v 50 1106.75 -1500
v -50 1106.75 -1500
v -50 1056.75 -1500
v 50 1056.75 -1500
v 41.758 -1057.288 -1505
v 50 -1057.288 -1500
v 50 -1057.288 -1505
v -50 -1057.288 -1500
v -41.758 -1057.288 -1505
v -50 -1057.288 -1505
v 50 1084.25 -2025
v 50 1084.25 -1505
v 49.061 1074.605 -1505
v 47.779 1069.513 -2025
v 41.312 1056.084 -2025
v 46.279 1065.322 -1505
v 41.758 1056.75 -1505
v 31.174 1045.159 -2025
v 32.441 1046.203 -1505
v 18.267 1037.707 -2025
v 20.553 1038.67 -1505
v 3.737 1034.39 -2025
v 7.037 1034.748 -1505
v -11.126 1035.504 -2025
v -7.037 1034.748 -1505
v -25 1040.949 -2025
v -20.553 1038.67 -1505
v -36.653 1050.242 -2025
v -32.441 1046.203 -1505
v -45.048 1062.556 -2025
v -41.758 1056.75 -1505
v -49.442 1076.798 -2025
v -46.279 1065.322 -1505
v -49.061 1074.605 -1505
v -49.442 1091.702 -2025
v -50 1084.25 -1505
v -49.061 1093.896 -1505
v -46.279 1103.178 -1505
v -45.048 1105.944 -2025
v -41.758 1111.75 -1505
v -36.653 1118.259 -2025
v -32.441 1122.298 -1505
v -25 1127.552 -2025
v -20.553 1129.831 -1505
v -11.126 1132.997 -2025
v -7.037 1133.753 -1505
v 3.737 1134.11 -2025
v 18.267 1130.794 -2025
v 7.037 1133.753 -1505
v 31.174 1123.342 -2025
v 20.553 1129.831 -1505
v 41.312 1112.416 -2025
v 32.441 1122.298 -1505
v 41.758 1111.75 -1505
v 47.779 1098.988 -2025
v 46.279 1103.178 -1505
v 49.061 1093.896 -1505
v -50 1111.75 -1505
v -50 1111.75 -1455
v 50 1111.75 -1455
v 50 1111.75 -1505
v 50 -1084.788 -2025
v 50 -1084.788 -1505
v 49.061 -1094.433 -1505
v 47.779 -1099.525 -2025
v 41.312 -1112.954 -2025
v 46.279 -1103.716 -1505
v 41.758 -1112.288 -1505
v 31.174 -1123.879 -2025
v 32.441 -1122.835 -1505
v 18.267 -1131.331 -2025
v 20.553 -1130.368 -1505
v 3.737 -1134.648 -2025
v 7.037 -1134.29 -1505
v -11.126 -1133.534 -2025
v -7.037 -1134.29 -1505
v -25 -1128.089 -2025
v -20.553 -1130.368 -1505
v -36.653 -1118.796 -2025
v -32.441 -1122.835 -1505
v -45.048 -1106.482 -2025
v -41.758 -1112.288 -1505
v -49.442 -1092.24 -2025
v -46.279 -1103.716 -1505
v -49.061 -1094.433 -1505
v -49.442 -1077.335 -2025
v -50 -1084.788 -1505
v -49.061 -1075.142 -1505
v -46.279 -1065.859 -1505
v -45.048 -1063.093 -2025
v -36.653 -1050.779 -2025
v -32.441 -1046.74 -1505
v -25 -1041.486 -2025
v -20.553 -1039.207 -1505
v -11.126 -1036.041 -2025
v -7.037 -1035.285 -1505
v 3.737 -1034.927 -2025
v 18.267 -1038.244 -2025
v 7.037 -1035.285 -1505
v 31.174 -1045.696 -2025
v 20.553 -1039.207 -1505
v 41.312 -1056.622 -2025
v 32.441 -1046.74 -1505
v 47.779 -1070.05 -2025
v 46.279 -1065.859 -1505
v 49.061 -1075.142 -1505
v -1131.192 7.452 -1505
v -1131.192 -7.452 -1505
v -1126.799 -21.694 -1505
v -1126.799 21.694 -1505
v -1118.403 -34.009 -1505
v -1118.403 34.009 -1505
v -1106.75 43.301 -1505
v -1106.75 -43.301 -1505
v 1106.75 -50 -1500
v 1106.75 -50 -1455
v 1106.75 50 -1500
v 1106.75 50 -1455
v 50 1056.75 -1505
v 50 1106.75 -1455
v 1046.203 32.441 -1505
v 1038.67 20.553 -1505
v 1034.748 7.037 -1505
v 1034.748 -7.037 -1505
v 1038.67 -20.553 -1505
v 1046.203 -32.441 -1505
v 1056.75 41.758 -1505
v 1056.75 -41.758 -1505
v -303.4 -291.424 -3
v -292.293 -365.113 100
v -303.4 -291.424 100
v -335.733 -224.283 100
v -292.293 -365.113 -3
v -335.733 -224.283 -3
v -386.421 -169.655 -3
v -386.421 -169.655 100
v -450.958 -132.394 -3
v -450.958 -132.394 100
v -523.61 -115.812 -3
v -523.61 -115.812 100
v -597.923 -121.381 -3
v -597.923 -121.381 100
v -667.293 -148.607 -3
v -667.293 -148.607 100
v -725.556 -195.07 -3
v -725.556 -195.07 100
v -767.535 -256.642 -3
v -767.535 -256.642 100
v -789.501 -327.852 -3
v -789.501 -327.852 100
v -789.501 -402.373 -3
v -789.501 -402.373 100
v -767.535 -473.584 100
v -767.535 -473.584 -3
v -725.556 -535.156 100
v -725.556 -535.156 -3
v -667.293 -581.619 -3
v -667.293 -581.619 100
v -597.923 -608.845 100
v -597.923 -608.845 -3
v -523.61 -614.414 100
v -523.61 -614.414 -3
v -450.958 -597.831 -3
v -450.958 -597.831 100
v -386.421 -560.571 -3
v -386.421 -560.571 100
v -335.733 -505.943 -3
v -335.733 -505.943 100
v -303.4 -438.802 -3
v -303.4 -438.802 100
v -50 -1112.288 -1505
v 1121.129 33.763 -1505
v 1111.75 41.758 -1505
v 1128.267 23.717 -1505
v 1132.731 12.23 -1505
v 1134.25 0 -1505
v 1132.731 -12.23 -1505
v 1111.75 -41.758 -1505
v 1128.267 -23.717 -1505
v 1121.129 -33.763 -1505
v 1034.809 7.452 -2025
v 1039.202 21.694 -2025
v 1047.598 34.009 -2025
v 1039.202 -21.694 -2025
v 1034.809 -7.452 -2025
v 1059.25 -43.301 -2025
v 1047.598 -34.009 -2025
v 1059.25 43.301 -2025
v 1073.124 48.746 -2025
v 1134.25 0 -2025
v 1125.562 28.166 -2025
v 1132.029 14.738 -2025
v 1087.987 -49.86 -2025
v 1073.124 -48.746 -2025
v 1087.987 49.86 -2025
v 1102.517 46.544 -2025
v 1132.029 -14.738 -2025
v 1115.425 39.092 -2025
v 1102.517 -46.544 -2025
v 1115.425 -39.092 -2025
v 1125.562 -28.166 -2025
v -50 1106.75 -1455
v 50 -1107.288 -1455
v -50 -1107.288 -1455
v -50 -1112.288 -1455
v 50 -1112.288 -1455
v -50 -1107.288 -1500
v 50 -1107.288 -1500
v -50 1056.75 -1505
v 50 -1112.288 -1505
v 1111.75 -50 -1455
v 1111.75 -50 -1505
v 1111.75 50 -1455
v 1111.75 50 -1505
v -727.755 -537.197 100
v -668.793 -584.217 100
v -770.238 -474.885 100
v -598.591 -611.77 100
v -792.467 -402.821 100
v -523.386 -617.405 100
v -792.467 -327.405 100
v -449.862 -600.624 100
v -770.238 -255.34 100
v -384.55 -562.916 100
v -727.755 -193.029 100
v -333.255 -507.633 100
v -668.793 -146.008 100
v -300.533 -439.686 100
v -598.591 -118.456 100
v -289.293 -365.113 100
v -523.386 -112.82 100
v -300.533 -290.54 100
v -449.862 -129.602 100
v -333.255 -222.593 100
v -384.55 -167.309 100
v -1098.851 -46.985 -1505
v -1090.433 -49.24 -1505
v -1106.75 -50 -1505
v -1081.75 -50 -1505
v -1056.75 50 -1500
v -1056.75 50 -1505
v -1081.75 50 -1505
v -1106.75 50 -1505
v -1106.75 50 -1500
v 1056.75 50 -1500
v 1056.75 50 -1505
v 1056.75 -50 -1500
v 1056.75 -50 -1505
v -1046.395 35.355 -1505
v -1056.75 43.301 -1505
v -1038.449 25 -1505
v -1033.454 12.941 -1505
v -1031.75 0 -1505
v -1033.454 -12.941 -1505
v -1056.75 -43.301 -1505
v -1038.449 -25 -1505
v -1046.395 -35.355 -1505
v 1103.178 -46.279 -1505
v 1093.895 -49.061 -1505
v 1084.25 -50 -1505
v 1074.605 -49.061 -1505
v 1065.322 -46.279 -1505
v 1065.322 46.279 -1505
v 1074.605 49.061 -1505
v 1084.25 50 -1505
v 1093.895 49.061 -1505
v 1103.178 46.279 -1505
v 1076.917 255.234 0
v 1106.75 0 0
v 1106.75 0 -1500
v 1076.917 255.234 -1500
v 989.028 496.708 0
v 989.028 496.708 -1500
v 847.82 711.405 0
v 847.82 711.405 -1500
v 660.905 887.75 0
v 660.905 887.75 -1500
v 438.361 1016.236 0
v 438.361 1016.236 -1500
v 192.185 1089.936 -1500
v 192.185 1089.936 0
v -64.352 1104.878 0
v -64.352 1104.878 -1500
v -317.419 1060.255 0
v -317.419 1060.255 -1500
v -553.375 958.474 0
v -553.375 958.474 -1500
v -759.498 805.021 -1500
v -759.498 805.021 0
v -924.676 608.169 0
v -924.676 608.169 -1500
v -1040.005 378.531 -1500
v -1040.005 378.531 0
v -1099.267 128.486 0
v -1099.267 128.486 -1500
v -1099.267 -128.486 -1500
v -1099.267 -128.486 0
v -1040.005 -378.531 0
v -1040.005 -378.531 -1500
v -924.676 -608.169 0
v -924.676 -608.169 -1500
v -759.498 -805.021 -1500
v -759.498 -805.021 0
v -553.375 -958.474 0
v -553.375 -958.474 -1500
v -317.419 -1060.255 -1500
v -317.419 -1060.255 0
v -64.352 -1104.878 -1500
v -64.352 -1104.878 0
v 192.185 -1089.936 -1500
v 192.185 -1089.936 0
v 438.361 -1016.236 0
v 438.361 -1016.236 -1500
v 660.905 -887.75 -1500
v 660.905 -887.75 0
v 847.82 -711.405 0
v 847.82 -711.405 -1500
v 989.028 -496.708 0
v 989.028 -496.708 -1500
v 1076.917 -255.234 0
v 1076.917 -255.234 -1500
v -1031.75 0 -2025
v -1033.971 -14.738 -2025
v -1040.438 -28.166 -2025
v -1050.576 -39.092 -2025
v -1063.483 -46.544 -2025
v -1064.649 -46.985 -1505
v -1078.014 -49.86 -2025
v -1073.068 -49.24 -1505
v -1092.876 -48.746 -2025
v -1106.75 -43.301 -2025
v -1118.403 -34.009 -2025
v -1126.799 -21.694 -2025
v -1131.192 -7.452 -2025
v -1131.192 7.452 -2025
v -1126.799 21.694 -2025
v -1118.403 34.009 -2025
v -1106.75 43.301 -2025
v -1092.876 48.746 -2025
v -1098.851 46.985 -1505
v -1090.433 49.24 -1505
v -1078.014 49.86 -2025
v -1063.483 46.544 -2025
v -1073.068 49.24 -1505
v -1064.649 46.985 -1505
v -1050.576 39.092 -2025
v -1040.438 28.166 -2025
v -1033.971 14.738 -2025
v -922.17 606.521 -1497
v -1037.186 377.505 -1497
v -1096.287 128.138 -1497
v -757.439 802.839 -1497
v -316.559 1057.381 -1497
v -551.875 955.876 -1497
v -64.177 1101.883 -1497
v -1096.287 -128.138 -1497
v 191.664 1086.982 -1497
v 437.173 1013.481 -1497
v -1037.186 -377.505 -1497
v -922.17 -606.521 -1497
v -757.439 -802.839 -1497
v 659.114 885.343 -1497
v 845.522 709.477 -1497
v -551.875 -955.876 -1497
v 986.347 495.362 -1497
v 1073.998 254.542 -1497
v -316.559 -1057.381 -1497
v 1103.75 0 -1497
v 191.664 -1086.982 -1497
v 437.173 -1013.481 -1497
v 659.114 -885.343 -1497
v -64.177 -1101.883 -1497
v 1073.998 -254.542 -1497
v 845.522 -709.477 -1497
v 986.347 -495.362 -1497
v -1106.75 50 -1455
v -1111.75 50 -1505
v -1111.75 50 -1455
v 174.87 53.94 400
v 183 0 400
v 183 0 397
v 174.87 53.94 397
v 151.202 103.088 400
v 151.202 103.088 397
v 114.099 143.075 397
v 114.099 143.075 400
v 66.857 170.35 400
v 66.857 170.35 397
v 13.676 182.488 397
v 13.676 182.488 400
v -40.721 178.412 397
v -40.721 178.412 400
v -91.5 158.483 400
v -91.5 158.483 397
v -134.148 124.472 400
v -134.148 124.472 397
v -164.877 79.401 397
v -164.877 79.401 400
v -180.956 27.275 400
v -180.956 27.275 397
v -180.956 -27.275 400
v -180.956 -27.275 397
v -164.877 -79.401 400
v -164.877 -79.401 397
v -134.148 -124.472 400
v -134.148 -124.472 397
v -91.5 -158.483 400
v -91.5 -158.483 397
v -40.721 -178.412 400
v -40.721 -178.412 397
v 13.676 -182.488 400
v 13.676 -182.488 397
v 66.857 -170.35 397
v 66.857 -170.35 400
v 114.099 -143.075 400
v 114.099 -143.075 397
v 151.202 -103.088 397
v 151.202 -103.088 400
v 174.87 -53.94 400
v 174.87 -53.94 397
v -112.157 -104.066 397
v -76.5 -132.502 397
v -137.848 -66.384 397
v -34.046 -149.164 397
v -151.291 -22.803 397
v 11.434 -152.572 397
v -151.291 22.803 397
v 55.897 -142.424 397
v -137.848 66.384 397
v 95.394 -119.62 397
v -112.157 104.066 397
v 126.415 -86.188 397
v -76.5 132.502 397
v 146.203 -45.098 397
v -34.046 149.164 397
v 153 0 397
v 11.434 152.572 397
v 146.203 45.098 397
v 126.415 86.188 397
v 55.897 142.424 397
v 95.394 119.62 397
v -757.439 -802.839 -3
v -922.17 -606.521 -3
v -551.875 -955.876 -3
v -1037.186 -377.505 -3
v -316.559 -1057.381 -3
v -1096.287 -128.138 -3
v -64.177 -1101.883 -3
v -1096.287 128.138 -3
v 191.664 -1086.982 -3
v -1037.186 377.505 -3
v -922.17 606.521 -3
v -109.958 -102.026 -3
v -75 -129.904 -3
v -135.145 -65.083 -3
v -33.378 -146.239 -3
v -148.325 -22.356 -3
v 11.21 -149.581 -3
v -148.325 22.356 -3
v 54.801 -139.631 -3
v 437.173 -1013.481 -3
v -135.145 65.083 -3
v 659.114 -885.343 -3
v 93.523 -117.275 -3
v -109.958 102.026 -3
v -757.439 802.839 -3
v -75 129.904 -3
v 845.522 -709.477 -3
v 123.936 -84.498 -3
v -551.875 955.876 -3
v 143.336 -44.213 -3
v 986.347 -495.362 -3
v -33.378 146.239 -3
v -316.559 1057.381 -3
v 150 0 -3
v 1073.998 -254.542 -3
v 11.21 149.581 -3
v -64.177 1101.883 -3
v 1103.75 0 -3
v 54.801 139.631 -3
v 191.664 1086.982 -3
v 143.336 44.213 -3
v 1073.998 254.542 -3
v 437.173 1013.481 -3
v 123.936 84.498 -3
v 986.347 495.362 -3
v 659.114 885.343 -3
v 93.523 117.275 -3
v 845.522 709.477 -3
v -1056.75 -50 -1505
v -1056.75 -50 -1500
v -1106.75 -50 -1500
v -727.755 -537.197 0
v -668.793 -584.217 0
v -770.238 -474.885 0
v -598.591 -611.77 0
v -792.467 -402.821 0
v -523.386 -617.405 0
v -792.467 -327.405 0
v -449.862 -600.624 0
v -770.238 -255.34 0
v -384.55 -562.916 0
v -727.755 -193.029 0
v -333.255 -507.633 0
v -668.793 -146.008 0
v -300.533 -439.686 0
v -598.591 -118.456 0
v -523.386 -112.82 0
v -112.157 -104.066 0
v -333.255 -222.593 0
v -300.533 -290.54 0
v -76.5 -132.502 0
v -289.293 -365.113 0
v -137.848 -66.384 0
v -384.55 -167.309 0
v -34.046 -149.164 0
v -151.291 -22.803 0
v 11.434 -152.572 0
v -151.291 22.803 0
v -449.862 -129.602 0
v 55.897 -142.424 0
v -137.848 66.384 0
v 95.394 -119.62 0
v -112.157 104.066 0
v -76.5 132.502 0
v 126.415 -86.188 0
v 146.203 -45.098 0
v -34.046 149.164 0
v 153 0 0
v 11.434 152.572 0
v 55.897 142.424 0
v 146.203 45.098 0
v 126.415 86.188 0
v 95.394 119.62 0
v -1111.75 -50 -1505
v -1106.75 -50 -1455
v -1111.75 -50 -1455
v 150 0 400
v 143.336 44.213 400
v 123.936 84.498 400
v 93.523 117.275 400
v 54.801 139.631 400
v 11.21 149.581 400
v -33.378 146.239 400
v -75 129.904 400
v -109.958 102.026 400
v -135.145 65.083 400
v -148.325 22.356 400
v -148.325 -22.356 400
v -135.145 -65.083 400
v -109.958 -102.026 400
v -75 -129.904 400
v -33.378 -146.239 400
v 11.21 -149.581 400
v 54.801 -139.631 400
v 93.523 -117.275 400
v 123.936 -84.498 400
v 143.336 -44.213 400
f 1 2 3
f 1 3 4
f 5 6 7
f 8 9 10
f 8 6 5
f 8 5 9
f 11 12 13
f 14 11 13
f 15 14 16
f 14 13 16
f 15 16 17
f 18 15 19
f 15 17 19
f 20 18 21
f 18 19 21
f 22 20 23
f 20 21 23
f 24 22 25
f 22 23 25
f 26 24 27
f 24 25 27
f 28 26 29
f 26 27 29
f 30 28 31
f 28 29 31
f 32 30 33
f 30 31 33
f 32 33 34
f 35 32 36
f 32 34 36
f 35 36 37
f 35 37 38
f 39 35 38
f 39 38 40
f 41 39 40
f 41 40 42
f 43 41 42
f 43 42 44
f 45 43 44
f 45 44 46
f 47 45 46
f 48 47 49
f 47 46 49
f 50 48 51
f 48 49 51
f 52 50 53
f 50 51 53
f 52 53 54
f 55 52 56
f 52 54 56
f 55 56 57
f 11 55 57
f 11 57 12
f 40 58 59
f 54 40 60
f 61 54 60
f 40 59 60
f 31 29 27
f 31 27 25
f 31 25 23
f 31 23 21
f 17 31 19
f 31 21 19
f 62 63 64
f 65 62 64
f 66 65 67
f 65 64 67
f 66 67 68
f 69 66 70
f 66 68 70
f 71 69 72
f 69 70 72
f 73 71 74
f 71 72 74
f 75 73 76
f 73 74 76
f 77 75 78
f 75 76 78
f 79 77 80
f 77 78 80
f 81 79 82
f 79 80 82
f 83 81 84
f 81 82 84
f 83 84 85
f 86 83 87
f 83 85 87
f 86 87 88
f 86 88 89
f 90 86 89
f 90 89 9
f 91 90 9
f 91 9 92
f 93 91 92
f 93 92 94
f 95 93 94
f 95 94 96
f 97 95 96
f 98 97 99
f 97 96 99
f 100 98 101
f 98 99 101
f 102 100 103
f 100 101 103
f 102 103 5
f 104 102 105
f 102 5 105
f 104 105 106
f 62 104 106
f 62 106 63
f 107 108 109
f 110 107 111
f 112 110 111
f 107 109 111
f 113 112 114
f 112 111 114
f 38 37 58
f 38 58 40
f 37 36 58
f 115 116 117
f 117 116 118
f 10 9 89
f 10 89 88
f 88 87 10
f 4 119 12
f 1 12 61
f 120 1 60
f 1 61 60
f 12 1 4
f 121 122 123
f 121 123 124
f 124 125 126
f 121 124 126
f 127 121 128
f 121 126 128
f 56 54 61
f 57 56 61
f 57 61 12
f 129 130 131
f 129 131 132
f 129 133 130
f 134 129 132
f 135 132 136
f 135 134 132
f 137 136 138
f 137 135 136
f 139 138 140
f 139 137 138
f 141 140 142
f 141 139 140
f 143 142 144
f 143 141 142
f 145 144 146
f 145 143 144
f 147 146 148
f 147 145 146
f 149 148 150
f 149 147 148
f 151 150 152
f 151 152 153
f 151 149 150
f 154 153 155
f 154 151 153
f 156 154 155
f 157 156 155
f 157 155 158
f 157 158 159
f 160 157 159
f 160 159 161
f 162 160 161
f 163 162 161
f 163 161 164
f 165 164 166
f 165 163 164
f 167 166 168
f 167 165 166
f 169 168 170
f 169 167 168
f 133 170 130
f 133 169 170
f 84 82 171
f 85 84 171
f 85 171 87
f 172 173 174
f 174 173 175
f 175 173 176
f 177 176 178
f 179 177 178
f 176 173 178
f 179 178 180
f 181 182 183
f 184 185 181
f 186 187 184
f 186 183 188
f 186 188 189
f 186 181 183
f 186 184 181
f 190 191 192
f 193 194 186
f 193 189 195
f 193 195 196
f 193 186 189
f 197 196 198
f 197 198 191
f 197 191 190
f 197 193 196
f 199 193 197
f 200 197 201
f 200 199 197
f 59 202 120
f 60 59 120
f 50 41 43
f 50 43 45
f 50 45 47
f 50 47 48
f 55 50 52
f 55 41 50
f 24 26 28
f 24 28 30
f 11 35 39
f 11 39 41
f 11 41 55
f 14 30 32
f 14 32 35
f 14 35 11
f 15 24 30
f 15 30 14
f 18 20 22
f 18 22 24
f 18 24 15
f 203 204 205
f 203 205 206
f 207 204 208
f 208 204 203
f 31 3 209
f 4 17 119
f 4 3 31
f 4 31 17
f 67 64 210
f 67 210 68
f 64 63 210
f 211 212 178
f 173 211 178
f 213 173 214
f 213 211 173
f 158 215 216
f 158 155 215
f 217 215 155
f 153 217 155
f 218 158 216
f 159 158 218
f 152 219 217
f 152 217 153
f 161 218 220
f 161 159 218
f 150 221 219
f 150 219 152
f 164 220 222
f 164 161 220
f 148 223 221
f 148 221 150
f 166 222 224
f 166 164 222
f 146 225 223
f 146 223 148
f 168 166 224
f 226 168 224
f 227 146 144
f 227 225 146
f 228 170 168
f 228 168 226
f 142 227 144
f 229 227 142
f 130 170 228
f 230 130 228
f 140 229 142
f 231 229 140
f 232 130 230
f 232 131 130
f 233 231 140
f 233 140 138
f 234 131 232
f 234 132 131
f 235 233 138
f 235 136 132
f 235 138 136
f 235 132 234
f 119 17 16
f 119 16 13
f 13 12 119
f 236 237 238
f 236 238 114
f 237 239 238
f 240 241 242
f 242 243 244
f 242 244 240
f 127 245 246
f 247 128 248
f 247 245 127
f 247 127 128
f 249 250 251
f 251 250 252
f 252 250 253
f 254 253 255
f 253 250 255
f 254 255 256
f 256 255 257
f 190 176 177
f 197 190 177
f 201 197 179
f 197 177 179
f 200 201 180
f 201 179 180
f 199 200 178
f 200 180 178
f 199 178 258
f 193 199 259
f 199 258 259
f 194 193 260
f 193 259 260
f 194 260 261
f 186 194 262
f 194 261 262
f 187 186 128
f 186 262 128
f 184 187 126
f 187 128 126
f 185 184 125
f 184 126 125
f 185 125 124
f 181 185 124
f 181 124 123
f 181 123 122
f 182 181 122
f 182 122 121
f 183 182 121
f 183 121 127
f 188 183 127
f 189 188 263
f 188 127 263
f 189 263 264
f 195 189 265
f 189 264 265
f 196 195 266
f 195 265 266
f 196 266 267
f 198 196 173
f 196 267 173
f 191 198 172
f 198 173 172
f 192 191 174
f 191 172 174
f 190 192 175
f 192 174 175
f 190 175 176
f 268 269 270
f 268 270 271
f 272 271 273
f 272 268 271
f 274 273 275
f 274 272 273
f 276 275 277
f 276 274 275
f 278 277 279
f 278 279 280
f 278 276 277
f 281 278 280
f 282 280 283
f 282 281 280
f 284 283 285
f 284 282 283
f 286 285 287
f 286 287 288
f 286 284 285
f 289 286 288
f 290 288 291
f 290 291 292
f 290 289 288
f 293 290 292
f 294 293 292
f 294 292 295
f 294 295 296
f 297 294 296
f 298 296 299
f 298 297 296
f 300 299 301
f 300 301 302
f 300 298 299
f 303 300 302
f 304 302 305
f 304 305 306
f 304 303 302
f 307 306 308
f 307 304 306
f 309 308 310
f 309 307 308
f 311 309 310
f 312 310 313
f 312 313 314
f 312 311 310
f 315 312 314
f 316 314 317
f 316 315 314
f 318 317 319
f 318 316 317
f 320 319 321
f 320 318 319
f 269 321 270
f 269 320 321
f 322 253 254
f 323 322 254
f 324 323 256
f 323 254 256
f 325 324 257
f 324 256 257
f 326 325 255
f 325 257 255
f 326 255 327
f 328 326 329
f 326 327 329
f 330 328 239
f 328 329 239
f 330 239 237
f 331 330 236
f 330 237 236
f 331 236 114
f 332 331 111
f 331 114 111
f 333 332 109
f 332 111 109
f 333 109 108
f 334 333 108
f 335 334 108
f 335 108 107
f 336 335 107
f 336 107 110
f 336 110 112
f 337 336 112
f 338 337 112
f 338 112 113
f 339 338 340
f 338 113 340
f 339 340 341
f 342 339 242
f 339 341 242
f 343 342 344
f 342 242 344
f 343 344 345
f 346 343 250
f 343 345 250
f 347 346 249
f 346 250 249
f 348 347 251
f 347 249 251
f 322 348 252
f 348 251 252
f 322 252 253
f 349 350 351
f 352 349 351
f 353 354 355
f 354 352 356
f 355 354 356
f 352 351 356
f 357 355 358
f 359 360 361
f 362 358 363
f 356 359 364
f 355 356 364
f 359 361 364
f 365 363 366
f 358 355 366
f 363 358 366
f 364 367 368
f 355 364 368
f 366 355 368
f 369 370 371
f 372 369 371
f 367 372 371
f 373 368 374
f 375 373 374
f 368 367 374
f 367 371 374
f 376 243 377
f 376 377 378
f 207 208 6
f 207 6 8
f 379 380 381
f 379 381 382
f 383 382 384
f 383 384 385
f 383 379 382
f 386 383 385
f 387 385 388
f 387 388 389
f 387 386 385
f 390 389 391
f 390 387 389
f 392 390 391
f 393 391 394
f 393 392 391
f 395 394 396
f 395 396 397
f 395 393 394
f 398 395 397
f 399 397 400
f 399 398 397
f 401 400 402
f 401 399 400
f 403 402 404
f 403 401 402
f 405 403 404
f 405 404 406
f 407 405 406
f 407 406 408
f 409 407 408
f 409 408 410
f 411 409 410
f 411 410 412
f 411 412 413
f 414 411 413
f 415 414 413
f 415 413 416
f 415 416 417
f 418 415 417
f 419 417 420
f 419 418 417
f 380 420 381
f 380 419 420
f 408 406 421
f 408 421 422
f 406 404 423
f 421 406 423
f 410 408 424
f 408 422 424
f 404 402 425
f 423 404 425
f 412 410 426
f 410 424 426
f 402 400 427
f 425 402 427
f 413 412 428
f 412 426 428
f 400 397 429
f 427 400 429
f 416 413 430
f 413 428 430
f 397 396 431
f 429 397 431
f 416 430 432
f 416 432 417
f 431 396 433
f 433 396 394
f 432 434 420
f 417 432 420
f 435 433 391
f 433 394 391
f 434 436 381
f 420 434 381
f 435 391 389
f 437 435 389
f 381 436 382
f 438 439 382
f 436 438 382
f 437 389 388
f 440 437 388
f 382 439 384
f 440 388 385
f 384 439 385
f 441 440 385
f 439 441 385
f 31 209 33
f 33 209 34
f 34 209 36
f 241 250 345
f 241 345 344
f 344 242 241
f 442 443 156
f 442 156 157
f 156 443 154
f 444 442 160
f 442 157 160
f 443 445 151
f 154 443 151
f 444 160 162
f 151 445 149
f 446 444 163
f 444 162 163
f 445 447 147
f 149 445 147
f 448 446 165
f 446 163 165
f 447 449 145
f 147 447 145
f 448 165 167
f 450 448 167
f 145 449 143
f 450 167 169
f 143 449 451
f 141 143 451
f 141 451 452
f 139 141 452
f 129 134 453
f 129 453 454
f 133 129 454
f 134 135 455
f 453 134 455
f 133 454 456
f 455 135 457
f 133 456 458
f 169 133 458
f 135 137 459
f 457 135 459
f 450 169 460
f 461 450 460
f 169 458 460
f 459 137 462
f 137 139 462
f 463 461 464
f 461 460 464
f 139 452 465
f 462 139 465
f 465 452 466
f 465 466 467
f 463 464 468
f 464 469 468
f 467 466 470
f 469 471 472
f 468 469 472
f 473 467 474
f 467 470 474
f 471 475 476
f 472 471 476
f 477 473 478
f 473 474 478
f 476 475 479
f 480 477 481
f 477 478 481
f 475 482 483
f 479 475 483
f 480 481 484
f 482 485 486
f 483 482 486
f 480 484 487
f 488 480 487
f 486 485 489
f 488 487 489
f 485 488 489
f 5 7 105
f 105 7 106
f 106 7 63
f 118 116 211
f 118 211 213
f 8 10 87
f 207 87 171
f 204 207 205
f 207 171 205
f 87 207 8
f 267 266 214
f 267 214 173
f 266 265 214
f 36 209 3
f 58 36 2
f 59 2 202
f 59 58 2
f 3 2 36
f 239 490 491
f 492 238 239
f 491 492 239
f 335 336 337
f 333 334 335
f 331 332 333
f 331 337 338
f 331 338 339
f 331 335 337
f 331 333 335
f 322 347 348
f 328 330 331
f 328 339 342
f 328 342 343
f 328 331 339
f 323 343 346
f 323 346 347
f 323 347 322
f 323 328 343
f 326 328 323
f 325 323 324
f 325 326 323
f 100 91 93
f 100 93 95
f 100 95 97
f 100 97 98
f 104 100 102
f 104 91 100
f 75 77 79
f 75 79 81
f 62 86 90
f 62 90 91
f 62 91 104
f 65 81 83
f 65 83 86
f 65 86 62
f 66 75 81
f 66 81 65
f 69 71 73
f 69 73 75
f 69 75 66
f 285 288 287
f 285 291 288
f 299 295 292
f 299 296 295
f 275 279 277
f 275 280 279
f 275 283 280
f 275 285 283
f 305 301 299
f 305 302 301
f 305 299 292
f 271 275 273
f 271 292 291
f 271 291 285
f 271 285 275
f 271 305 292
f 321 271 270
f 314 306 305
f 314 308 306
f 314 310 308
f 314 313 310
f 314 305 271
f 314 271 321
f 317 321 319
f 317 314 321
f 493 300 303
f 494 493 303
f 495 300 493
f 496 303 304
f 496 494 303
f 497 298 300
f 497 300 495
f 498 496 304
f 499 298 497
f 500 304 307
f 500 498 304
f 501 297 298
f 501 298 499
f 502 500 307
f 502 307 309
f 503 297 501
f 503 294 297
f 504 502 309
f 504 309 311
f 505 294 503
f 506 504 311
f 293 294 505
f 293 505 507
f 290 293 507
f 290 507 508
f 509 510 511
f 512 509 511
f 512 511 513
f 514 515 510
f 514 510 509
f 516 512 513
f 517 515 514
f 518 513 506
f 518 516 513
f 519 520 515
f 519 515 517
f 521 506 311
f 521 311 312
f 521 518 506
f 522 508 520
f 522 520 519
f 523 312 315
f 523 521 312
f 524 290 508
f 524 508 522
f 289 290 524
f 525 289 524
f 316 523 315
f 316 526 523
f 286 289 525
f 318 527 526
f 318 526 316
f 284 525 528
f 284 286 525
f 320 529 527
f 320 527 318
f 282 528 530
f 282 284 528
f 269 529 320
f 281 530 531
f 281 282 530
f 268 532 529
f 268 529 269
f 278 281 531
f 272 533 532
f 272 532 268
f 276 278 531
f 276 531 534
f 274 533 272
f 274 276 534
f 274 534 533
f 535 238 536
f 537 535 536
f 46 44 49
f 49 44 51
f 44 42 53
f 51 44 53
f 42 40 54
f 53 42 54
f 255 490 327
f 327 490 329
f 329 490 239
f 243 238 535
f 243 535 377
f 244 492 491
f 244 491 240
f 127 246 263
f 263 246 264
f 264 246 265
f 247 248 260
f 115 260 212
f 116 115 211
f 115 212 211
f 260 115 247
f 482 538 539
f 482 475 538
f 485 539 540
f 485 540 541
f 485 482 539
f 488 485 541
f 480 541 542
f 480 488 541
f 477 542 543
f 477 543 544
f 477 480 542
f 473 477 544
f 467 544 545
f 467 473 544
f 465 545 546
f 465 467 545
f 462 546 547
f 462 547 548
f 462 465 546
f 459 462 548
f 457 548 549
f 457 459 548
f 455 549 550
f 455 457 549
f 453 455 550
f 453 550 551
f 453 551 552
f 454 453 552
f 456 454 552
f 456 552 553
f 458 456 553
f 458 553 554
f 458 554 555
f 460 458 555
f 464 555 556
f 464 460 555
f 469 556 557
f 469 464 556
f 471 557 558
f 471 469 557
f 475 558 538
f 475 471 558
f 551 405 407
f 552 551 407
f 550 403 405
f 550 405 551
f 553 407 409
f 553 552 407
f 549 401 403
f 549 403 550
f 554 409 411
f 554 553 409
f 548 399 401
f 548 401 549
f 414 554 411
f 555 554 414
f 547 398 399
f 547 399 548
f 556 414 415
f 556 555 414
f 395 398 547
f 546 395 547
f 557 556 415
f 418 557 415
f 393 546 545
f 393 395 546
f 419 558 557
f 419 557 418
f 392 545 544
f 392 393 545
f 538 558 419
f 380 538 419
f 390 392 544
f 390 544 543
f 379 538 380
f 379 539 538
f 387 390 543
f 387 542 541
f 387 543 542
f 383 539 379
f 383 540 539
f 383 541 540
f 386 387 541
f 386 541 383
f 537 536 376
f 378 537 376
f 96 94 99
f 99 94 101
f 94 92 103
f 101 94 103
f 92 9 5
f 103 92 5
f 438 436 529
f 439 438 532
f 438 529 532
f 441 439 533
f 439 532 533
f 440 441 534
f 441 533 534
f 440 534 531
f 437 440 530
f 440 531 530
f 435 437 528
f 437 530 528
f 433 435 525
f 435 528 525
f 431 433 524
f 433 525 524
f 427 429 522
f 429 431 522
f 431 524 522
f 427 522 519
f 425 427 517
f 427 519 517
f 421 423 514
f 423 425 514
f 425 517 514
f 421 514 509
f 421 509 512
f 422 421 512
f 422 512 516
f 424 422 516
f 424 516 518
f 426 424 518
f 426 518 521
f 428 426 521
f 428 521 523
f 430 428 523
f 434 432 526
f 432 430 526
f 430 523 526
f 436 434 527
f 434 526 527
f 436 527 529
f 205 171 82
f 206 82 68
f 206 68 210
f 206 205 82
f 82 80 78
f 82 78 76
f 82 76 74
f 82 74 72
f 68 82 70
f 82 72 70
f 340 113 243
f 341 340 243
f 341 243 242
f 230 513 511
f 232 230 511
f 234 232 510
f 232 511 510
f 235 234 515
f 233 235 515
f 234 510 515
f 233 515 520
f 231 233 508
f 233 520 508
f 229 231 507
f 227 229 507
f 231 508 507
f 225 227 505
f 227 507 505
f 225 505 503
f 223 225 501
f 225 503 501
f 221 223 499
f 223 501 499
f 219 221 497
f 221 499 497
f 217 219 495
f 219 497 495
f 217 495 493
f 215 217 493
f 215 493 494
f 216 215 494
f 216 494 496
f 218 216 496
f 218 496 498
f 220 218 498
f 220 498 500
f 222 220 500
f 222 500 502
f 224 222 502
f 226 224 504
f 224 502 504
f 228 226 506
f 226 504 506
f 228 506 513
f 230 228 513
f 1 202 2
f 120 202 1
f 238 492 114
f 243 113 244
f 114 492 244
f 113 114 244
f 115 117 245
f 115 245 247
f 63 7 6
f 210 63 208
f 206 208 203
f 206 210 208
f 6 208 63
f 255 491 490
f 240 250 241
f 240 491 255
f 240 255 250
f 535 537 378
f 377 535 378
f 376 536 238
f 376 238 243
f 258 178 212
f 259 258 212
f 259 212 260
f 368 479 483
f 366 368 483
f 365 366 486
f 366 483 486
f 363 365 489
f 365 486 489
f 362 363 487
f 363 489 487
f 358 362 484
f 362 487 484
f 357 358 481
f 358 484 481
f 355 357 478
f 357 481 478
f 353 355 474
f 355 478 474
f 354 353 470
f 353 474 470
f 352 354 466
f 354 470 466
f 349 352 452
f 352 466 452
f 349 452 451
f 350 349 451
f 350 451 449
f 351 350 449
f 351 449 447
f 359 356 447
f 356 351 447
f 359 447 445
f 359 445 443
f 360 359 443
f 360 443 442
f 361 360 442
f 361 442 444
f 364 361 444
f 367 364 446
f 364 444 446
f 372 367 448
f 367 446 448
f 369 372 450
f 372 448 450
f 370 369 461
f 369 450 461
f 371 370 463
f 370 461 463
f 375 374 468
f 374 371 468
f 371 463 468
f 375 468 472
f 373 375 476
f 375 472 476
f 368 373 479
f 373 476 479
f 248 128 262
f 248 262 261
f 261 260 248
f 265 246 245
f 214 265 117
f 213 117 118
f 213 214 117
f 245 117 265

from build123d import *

# Parameters (mm, degrees)
F0_R      = 1106.75
F0_R_2    = 1103.75
F1_DEPTH  = 1500
F2_R      = 1103.75
F3_DEPTH  = 3
F4_R      = 1103.75
F4_R_2    = 250
F4_R_3    = 150
F5_DEPTH  = 3
F6_R      = 253
F6_R_2    = 250
F7_DEPTH  = 100
F8_R      = 153
F8_R_2    = 150
F9_DEPTH  = 400
F10_R     = 183
F10_R_2   = 150
F11_DEPTH = 3
F13_W     = 100
F13_H     = 50
F14_DEPTH = 5
F15_W     = 100
F15_H     = 5
F16_DEPTH = 50
F18_W     = 100
F18_H     = 50
F19_DEPTH = 5
F20_W     = 100
F20_H     = 5
F21_DEPTH = 50
F23_W     = 100
F23_H     = 50
F24_DEPTH = 5
F25_W     = 100
F25_H     = 5
F26_DEPTH = 50
F28_W     = 100
F28_H     = 50
F29_DEPTH = 5
F30_W     = 100
F30_H     = 5
F31_DEPTH = 50
F32_R     = 50
F33_DEPTH = 520
F34_R     = 50
F35_DEPTH = 520
F36_R     = 50
F37_DEPTH = 520
F38_R     = 50
F39_DEPTH = 520


with BuildPart() as f1:
    # F0 (on Top) → F1 (new body)
    with BuildSketch(Plane.XY):
        Circle(F0_R)
        Circle(F0_R_2, mode=Mode.SUBTRACT)
    extrude(amount=-F1_DEPTH)

    # F2 (on face) → F3 (join)
    with BuildSketch(Plane(origin=(0, 0, -1500), x_dir=(1, 0, 0), z_dir=(0, 0, -1))):
        Circle(F2_R)
    extrude(amount=-F3_DEPTH)

    # F4 (on face) → F5 (join)
    with BuildSketch(Plane.XY):
        Circle(F4_R)
        with Locations((-542.2929684516, -365.1128577139)):
            Circle(F4_R_2, mode=Mode.SUBTRACT)
        Circle(F4_R_3, mode=Mode.SUBTRACT)
    extrude(amount=-F5_DEPTH)

    # F6 (on face) → F7 (join)
    with BuildSketch(Plane.XY):
        with Locations((-542.2929684516, -365.1128577139)):
            Circle(F6_R)
        with Locations((-542.2929684516, -365.1128577139)):
            Circle(F6_R_2, mode=Mode.SUBTRACT)
    extrude(amount=F7_DEPTH)

    # F8 (on face) → F9 (join)
    with BuildSketch(Plane.XY):
        Circle(F8_R)
        Circle(F8_R_2, mode=Mode.SUBTRACT)
    extrude(amount=F9_DEPTH)

    # F10 (on face) → F11 (join)
    with BuildSketch(Plane.XY.offset(400)):
        Circle(F10_R)
        Circle(F10_R_2, mode=Mode.SUBTRACT)
    extrude(amount=-F11_DEPTH)


with BuildPart() as f14:
    # F13 (on offset) → F14 (new body)
    with BuildSketch(Plane.XZ.offset(1107.2876)):
        with Locations((0, -1480)):
            Rectangle(F13_W, F13_H)
    extrude(amount=F14_DEPTH)

    # F15 (on face) → F16 (join)
    with BuildSketch(Plane(origin=(0, -1107.2876, 0), x_dir=(-1, 0, 0), z_dir=(0, 1, 0))):
        with Locations((0, -1502.5)):
            Rectangle(F15_W, F15_H)
    extrude(amount=F16_DEPTH)

    # F36 (on face) → F37 (join)
    with BuildSketch(Plane(origin=(0, 0, -1505), x_dir=(1, 0, 0), z_dir=(0, 0, -1))):
        with Locations((0, 1084.7876)):
            Circle(F36_R)
    extrude(amount=F37_DEPTH)


with BuildPart() as f19:
    # F18 (on offset) → F19 (new body)
    with BuildSketch(Plane.XZ.offset(-1106.75031)):
        with Locations((0, -1480)):
            Rectangle(F18_W, F18_H)
    extrude(amount=-F19_DEPTH)

    # F20 (on face) → F21 (join)
    with BuildSketch(Plane.XZ.offset(-1106.75031)):
        with Locations((0, -1502.5)):
            Rectangle(F20_W, F20_H)
    extrude(amount=F21_DEPTH)

    # F32 (on face) → F33 (join)
    with BuildSketch(Plane(origin=(0, 0, -1505), x_dir=(1, 0, 0), z_dir=(0, 0, -1))):
        with Locations((0, -1084.25031)):
            Circle(F32_R)
    extrude(amount=F33_DEPTH)


with BuildPart() as f24:
    # F23 (on offset) → F24 (new body)
    with BuildSketch(Plane.YZ.offset(1106.75011)):
        with Locations((0, -1480)):
            Rectangle(F23_W, F23_H)
    extrude(amount=F24_DEPTH)

    # F25 (on face) → F26 (join)
    with BuildSketch(Plane(origin=(1106.75011, 0, 0), x_dir=(0, -1, 0), z_dir=(-1, 0, 0))):
        with Locations((0, -1502.5)):
            Rectangle(F25_W, F25_H)
    extrude(amount=F26_DEPTH)

    # F34 (on face) → F35 (join)
    with BuildSketch(Plane(origin=(0, 0, -1505), x_dir=(1, 0, 0), z_dir=(0, 0, -1))):
        with Locations((1084.25011, 0)):
            Circle(F34_R)
    extrude(amount=F35_DEPTH)


with BuildPart() as f29:
    # F28 (on offset) → F29 (new body)
    with BuildSketch(Plane.YZ.offset(-1106.75011)):
        with Locations((0, -1480)):
            Rectangle(F28_W, F28_H)
    extrude(amount=-F29_DEPTH)


with BuildPart() as f31:
    # F30 (on face) → F31 (new body)
    with BuildSketch(Plane.YZ.offset(-1106.75011)):
        with Locations((0, -1502.5)):
            Rectangle(F30_W, F30_H)
    extrude(amount=F31_DEPTH)

    # F38 (on face) → F39 (join)
    with BuildSketch(Plane(origin=(0, 0, -1505), x_dir=(1, 0, 0), z_dir=(0, 0, -1))):
        with Locations((-1081.75011, 0)):
            Circle(F38_R)
    extrude(amount=F39_DEPTH)


solid = Compound([f1.part, f14.part, f19.part, f24.part, f29.part, f31.part])
